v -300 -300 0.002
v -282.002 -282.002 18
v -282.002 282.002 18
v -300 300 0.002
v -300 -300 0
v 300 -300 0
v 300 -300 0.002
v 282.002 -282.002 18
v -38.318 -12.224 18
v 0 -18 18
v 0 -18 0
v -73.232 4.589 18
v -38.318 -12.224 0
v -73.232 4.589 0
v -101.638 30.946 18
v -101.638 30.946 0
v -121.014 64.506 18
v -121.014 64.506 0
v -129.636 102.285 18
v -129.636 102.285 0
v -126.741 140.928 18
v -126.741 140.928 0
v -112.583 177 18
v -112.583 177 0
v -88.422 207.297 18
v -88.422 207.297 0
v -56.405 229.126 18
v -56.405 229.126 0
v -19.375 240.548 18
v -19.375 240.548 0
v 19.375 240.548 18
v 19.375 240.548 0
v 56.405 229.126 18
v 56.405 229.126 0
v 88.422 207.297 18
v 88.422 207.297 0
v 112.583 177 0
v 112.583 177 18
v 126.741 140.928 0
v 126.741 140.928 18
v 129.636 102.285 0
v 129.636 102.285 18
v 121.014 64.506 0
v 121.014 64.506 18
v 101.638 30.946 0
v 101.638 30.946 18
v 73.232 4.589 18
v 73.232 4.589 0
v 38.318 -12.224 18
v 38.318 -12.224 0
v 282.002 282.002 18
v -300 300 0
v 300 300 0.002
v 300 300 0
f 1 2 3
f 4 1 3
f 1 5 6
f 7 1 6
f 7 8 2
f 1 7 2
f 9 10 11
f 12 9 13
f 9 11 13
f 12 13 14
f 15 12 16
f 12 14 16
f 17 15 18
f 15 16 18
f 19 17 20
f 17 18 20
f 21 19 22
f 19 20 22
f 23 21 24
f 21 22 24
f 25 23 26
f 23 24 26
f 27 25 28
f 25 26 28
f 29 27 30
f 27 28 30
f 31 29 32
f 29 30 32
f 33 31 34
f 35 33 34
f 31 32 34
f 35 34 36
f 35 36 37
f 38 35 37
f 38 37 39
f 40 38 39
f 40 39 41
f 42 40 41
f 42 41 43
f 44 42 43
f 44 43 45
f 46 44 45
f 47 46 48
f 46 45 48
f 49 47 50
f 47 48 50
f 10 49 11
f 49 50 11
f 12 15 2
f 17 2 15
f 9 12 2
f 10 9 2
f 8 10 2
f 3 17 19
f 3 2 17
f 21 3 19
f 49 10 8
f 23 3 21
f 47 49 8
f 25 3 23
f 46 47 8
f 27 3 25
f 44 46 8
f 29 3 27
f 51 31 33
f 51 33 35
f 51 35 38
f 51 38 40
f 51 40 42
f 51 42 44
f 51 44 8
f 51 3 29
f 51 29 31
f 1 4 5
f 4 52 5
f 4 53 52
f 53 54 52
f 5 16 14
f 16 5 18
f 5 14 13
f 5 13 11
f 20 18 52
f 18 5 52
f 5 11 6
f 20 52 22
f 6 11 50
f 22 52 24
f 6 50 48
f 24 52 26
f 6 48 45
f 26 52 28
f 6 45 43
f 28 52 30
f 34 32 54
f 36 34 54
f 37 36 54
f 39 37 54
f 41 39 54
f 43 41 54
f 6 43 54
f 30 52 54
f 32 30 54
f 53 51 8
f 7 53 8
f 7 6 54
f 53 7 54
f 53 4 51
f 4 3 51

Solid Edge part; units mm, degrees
sketch "Sketch1" plane through (0, 0, 0) normal (0, 0, 1) x (1, 0, 0)
  line L0 (-300, -300) -> (300, -300)
  line L1 (300, -300) -> (300, 300)
  line L2 (300, 300) -> (-300, 300)
  line L3 (-300, 300) -> (-300, -300)
extrude "Protrusion1" add sketch "Sketch1" along normal blind 18
chamfer "Chamfer_2" distance 18 angle 45 4 edges at (0, -300, 18) (300, 0, 18) (0, 300, 18) (-300, 0, 18)
sketch "Sketch2" plane through (0, 0, 0) normal (0, 0, -1) x (0, -1, 0)
  circle A0 centre (-112, 0) radius 130
  dimension "D1" = 188
extrude "ExtrudedCutout_1" cut sketch "Sketch2" against normal blind 18
properties material "Wood, Mahogany"
